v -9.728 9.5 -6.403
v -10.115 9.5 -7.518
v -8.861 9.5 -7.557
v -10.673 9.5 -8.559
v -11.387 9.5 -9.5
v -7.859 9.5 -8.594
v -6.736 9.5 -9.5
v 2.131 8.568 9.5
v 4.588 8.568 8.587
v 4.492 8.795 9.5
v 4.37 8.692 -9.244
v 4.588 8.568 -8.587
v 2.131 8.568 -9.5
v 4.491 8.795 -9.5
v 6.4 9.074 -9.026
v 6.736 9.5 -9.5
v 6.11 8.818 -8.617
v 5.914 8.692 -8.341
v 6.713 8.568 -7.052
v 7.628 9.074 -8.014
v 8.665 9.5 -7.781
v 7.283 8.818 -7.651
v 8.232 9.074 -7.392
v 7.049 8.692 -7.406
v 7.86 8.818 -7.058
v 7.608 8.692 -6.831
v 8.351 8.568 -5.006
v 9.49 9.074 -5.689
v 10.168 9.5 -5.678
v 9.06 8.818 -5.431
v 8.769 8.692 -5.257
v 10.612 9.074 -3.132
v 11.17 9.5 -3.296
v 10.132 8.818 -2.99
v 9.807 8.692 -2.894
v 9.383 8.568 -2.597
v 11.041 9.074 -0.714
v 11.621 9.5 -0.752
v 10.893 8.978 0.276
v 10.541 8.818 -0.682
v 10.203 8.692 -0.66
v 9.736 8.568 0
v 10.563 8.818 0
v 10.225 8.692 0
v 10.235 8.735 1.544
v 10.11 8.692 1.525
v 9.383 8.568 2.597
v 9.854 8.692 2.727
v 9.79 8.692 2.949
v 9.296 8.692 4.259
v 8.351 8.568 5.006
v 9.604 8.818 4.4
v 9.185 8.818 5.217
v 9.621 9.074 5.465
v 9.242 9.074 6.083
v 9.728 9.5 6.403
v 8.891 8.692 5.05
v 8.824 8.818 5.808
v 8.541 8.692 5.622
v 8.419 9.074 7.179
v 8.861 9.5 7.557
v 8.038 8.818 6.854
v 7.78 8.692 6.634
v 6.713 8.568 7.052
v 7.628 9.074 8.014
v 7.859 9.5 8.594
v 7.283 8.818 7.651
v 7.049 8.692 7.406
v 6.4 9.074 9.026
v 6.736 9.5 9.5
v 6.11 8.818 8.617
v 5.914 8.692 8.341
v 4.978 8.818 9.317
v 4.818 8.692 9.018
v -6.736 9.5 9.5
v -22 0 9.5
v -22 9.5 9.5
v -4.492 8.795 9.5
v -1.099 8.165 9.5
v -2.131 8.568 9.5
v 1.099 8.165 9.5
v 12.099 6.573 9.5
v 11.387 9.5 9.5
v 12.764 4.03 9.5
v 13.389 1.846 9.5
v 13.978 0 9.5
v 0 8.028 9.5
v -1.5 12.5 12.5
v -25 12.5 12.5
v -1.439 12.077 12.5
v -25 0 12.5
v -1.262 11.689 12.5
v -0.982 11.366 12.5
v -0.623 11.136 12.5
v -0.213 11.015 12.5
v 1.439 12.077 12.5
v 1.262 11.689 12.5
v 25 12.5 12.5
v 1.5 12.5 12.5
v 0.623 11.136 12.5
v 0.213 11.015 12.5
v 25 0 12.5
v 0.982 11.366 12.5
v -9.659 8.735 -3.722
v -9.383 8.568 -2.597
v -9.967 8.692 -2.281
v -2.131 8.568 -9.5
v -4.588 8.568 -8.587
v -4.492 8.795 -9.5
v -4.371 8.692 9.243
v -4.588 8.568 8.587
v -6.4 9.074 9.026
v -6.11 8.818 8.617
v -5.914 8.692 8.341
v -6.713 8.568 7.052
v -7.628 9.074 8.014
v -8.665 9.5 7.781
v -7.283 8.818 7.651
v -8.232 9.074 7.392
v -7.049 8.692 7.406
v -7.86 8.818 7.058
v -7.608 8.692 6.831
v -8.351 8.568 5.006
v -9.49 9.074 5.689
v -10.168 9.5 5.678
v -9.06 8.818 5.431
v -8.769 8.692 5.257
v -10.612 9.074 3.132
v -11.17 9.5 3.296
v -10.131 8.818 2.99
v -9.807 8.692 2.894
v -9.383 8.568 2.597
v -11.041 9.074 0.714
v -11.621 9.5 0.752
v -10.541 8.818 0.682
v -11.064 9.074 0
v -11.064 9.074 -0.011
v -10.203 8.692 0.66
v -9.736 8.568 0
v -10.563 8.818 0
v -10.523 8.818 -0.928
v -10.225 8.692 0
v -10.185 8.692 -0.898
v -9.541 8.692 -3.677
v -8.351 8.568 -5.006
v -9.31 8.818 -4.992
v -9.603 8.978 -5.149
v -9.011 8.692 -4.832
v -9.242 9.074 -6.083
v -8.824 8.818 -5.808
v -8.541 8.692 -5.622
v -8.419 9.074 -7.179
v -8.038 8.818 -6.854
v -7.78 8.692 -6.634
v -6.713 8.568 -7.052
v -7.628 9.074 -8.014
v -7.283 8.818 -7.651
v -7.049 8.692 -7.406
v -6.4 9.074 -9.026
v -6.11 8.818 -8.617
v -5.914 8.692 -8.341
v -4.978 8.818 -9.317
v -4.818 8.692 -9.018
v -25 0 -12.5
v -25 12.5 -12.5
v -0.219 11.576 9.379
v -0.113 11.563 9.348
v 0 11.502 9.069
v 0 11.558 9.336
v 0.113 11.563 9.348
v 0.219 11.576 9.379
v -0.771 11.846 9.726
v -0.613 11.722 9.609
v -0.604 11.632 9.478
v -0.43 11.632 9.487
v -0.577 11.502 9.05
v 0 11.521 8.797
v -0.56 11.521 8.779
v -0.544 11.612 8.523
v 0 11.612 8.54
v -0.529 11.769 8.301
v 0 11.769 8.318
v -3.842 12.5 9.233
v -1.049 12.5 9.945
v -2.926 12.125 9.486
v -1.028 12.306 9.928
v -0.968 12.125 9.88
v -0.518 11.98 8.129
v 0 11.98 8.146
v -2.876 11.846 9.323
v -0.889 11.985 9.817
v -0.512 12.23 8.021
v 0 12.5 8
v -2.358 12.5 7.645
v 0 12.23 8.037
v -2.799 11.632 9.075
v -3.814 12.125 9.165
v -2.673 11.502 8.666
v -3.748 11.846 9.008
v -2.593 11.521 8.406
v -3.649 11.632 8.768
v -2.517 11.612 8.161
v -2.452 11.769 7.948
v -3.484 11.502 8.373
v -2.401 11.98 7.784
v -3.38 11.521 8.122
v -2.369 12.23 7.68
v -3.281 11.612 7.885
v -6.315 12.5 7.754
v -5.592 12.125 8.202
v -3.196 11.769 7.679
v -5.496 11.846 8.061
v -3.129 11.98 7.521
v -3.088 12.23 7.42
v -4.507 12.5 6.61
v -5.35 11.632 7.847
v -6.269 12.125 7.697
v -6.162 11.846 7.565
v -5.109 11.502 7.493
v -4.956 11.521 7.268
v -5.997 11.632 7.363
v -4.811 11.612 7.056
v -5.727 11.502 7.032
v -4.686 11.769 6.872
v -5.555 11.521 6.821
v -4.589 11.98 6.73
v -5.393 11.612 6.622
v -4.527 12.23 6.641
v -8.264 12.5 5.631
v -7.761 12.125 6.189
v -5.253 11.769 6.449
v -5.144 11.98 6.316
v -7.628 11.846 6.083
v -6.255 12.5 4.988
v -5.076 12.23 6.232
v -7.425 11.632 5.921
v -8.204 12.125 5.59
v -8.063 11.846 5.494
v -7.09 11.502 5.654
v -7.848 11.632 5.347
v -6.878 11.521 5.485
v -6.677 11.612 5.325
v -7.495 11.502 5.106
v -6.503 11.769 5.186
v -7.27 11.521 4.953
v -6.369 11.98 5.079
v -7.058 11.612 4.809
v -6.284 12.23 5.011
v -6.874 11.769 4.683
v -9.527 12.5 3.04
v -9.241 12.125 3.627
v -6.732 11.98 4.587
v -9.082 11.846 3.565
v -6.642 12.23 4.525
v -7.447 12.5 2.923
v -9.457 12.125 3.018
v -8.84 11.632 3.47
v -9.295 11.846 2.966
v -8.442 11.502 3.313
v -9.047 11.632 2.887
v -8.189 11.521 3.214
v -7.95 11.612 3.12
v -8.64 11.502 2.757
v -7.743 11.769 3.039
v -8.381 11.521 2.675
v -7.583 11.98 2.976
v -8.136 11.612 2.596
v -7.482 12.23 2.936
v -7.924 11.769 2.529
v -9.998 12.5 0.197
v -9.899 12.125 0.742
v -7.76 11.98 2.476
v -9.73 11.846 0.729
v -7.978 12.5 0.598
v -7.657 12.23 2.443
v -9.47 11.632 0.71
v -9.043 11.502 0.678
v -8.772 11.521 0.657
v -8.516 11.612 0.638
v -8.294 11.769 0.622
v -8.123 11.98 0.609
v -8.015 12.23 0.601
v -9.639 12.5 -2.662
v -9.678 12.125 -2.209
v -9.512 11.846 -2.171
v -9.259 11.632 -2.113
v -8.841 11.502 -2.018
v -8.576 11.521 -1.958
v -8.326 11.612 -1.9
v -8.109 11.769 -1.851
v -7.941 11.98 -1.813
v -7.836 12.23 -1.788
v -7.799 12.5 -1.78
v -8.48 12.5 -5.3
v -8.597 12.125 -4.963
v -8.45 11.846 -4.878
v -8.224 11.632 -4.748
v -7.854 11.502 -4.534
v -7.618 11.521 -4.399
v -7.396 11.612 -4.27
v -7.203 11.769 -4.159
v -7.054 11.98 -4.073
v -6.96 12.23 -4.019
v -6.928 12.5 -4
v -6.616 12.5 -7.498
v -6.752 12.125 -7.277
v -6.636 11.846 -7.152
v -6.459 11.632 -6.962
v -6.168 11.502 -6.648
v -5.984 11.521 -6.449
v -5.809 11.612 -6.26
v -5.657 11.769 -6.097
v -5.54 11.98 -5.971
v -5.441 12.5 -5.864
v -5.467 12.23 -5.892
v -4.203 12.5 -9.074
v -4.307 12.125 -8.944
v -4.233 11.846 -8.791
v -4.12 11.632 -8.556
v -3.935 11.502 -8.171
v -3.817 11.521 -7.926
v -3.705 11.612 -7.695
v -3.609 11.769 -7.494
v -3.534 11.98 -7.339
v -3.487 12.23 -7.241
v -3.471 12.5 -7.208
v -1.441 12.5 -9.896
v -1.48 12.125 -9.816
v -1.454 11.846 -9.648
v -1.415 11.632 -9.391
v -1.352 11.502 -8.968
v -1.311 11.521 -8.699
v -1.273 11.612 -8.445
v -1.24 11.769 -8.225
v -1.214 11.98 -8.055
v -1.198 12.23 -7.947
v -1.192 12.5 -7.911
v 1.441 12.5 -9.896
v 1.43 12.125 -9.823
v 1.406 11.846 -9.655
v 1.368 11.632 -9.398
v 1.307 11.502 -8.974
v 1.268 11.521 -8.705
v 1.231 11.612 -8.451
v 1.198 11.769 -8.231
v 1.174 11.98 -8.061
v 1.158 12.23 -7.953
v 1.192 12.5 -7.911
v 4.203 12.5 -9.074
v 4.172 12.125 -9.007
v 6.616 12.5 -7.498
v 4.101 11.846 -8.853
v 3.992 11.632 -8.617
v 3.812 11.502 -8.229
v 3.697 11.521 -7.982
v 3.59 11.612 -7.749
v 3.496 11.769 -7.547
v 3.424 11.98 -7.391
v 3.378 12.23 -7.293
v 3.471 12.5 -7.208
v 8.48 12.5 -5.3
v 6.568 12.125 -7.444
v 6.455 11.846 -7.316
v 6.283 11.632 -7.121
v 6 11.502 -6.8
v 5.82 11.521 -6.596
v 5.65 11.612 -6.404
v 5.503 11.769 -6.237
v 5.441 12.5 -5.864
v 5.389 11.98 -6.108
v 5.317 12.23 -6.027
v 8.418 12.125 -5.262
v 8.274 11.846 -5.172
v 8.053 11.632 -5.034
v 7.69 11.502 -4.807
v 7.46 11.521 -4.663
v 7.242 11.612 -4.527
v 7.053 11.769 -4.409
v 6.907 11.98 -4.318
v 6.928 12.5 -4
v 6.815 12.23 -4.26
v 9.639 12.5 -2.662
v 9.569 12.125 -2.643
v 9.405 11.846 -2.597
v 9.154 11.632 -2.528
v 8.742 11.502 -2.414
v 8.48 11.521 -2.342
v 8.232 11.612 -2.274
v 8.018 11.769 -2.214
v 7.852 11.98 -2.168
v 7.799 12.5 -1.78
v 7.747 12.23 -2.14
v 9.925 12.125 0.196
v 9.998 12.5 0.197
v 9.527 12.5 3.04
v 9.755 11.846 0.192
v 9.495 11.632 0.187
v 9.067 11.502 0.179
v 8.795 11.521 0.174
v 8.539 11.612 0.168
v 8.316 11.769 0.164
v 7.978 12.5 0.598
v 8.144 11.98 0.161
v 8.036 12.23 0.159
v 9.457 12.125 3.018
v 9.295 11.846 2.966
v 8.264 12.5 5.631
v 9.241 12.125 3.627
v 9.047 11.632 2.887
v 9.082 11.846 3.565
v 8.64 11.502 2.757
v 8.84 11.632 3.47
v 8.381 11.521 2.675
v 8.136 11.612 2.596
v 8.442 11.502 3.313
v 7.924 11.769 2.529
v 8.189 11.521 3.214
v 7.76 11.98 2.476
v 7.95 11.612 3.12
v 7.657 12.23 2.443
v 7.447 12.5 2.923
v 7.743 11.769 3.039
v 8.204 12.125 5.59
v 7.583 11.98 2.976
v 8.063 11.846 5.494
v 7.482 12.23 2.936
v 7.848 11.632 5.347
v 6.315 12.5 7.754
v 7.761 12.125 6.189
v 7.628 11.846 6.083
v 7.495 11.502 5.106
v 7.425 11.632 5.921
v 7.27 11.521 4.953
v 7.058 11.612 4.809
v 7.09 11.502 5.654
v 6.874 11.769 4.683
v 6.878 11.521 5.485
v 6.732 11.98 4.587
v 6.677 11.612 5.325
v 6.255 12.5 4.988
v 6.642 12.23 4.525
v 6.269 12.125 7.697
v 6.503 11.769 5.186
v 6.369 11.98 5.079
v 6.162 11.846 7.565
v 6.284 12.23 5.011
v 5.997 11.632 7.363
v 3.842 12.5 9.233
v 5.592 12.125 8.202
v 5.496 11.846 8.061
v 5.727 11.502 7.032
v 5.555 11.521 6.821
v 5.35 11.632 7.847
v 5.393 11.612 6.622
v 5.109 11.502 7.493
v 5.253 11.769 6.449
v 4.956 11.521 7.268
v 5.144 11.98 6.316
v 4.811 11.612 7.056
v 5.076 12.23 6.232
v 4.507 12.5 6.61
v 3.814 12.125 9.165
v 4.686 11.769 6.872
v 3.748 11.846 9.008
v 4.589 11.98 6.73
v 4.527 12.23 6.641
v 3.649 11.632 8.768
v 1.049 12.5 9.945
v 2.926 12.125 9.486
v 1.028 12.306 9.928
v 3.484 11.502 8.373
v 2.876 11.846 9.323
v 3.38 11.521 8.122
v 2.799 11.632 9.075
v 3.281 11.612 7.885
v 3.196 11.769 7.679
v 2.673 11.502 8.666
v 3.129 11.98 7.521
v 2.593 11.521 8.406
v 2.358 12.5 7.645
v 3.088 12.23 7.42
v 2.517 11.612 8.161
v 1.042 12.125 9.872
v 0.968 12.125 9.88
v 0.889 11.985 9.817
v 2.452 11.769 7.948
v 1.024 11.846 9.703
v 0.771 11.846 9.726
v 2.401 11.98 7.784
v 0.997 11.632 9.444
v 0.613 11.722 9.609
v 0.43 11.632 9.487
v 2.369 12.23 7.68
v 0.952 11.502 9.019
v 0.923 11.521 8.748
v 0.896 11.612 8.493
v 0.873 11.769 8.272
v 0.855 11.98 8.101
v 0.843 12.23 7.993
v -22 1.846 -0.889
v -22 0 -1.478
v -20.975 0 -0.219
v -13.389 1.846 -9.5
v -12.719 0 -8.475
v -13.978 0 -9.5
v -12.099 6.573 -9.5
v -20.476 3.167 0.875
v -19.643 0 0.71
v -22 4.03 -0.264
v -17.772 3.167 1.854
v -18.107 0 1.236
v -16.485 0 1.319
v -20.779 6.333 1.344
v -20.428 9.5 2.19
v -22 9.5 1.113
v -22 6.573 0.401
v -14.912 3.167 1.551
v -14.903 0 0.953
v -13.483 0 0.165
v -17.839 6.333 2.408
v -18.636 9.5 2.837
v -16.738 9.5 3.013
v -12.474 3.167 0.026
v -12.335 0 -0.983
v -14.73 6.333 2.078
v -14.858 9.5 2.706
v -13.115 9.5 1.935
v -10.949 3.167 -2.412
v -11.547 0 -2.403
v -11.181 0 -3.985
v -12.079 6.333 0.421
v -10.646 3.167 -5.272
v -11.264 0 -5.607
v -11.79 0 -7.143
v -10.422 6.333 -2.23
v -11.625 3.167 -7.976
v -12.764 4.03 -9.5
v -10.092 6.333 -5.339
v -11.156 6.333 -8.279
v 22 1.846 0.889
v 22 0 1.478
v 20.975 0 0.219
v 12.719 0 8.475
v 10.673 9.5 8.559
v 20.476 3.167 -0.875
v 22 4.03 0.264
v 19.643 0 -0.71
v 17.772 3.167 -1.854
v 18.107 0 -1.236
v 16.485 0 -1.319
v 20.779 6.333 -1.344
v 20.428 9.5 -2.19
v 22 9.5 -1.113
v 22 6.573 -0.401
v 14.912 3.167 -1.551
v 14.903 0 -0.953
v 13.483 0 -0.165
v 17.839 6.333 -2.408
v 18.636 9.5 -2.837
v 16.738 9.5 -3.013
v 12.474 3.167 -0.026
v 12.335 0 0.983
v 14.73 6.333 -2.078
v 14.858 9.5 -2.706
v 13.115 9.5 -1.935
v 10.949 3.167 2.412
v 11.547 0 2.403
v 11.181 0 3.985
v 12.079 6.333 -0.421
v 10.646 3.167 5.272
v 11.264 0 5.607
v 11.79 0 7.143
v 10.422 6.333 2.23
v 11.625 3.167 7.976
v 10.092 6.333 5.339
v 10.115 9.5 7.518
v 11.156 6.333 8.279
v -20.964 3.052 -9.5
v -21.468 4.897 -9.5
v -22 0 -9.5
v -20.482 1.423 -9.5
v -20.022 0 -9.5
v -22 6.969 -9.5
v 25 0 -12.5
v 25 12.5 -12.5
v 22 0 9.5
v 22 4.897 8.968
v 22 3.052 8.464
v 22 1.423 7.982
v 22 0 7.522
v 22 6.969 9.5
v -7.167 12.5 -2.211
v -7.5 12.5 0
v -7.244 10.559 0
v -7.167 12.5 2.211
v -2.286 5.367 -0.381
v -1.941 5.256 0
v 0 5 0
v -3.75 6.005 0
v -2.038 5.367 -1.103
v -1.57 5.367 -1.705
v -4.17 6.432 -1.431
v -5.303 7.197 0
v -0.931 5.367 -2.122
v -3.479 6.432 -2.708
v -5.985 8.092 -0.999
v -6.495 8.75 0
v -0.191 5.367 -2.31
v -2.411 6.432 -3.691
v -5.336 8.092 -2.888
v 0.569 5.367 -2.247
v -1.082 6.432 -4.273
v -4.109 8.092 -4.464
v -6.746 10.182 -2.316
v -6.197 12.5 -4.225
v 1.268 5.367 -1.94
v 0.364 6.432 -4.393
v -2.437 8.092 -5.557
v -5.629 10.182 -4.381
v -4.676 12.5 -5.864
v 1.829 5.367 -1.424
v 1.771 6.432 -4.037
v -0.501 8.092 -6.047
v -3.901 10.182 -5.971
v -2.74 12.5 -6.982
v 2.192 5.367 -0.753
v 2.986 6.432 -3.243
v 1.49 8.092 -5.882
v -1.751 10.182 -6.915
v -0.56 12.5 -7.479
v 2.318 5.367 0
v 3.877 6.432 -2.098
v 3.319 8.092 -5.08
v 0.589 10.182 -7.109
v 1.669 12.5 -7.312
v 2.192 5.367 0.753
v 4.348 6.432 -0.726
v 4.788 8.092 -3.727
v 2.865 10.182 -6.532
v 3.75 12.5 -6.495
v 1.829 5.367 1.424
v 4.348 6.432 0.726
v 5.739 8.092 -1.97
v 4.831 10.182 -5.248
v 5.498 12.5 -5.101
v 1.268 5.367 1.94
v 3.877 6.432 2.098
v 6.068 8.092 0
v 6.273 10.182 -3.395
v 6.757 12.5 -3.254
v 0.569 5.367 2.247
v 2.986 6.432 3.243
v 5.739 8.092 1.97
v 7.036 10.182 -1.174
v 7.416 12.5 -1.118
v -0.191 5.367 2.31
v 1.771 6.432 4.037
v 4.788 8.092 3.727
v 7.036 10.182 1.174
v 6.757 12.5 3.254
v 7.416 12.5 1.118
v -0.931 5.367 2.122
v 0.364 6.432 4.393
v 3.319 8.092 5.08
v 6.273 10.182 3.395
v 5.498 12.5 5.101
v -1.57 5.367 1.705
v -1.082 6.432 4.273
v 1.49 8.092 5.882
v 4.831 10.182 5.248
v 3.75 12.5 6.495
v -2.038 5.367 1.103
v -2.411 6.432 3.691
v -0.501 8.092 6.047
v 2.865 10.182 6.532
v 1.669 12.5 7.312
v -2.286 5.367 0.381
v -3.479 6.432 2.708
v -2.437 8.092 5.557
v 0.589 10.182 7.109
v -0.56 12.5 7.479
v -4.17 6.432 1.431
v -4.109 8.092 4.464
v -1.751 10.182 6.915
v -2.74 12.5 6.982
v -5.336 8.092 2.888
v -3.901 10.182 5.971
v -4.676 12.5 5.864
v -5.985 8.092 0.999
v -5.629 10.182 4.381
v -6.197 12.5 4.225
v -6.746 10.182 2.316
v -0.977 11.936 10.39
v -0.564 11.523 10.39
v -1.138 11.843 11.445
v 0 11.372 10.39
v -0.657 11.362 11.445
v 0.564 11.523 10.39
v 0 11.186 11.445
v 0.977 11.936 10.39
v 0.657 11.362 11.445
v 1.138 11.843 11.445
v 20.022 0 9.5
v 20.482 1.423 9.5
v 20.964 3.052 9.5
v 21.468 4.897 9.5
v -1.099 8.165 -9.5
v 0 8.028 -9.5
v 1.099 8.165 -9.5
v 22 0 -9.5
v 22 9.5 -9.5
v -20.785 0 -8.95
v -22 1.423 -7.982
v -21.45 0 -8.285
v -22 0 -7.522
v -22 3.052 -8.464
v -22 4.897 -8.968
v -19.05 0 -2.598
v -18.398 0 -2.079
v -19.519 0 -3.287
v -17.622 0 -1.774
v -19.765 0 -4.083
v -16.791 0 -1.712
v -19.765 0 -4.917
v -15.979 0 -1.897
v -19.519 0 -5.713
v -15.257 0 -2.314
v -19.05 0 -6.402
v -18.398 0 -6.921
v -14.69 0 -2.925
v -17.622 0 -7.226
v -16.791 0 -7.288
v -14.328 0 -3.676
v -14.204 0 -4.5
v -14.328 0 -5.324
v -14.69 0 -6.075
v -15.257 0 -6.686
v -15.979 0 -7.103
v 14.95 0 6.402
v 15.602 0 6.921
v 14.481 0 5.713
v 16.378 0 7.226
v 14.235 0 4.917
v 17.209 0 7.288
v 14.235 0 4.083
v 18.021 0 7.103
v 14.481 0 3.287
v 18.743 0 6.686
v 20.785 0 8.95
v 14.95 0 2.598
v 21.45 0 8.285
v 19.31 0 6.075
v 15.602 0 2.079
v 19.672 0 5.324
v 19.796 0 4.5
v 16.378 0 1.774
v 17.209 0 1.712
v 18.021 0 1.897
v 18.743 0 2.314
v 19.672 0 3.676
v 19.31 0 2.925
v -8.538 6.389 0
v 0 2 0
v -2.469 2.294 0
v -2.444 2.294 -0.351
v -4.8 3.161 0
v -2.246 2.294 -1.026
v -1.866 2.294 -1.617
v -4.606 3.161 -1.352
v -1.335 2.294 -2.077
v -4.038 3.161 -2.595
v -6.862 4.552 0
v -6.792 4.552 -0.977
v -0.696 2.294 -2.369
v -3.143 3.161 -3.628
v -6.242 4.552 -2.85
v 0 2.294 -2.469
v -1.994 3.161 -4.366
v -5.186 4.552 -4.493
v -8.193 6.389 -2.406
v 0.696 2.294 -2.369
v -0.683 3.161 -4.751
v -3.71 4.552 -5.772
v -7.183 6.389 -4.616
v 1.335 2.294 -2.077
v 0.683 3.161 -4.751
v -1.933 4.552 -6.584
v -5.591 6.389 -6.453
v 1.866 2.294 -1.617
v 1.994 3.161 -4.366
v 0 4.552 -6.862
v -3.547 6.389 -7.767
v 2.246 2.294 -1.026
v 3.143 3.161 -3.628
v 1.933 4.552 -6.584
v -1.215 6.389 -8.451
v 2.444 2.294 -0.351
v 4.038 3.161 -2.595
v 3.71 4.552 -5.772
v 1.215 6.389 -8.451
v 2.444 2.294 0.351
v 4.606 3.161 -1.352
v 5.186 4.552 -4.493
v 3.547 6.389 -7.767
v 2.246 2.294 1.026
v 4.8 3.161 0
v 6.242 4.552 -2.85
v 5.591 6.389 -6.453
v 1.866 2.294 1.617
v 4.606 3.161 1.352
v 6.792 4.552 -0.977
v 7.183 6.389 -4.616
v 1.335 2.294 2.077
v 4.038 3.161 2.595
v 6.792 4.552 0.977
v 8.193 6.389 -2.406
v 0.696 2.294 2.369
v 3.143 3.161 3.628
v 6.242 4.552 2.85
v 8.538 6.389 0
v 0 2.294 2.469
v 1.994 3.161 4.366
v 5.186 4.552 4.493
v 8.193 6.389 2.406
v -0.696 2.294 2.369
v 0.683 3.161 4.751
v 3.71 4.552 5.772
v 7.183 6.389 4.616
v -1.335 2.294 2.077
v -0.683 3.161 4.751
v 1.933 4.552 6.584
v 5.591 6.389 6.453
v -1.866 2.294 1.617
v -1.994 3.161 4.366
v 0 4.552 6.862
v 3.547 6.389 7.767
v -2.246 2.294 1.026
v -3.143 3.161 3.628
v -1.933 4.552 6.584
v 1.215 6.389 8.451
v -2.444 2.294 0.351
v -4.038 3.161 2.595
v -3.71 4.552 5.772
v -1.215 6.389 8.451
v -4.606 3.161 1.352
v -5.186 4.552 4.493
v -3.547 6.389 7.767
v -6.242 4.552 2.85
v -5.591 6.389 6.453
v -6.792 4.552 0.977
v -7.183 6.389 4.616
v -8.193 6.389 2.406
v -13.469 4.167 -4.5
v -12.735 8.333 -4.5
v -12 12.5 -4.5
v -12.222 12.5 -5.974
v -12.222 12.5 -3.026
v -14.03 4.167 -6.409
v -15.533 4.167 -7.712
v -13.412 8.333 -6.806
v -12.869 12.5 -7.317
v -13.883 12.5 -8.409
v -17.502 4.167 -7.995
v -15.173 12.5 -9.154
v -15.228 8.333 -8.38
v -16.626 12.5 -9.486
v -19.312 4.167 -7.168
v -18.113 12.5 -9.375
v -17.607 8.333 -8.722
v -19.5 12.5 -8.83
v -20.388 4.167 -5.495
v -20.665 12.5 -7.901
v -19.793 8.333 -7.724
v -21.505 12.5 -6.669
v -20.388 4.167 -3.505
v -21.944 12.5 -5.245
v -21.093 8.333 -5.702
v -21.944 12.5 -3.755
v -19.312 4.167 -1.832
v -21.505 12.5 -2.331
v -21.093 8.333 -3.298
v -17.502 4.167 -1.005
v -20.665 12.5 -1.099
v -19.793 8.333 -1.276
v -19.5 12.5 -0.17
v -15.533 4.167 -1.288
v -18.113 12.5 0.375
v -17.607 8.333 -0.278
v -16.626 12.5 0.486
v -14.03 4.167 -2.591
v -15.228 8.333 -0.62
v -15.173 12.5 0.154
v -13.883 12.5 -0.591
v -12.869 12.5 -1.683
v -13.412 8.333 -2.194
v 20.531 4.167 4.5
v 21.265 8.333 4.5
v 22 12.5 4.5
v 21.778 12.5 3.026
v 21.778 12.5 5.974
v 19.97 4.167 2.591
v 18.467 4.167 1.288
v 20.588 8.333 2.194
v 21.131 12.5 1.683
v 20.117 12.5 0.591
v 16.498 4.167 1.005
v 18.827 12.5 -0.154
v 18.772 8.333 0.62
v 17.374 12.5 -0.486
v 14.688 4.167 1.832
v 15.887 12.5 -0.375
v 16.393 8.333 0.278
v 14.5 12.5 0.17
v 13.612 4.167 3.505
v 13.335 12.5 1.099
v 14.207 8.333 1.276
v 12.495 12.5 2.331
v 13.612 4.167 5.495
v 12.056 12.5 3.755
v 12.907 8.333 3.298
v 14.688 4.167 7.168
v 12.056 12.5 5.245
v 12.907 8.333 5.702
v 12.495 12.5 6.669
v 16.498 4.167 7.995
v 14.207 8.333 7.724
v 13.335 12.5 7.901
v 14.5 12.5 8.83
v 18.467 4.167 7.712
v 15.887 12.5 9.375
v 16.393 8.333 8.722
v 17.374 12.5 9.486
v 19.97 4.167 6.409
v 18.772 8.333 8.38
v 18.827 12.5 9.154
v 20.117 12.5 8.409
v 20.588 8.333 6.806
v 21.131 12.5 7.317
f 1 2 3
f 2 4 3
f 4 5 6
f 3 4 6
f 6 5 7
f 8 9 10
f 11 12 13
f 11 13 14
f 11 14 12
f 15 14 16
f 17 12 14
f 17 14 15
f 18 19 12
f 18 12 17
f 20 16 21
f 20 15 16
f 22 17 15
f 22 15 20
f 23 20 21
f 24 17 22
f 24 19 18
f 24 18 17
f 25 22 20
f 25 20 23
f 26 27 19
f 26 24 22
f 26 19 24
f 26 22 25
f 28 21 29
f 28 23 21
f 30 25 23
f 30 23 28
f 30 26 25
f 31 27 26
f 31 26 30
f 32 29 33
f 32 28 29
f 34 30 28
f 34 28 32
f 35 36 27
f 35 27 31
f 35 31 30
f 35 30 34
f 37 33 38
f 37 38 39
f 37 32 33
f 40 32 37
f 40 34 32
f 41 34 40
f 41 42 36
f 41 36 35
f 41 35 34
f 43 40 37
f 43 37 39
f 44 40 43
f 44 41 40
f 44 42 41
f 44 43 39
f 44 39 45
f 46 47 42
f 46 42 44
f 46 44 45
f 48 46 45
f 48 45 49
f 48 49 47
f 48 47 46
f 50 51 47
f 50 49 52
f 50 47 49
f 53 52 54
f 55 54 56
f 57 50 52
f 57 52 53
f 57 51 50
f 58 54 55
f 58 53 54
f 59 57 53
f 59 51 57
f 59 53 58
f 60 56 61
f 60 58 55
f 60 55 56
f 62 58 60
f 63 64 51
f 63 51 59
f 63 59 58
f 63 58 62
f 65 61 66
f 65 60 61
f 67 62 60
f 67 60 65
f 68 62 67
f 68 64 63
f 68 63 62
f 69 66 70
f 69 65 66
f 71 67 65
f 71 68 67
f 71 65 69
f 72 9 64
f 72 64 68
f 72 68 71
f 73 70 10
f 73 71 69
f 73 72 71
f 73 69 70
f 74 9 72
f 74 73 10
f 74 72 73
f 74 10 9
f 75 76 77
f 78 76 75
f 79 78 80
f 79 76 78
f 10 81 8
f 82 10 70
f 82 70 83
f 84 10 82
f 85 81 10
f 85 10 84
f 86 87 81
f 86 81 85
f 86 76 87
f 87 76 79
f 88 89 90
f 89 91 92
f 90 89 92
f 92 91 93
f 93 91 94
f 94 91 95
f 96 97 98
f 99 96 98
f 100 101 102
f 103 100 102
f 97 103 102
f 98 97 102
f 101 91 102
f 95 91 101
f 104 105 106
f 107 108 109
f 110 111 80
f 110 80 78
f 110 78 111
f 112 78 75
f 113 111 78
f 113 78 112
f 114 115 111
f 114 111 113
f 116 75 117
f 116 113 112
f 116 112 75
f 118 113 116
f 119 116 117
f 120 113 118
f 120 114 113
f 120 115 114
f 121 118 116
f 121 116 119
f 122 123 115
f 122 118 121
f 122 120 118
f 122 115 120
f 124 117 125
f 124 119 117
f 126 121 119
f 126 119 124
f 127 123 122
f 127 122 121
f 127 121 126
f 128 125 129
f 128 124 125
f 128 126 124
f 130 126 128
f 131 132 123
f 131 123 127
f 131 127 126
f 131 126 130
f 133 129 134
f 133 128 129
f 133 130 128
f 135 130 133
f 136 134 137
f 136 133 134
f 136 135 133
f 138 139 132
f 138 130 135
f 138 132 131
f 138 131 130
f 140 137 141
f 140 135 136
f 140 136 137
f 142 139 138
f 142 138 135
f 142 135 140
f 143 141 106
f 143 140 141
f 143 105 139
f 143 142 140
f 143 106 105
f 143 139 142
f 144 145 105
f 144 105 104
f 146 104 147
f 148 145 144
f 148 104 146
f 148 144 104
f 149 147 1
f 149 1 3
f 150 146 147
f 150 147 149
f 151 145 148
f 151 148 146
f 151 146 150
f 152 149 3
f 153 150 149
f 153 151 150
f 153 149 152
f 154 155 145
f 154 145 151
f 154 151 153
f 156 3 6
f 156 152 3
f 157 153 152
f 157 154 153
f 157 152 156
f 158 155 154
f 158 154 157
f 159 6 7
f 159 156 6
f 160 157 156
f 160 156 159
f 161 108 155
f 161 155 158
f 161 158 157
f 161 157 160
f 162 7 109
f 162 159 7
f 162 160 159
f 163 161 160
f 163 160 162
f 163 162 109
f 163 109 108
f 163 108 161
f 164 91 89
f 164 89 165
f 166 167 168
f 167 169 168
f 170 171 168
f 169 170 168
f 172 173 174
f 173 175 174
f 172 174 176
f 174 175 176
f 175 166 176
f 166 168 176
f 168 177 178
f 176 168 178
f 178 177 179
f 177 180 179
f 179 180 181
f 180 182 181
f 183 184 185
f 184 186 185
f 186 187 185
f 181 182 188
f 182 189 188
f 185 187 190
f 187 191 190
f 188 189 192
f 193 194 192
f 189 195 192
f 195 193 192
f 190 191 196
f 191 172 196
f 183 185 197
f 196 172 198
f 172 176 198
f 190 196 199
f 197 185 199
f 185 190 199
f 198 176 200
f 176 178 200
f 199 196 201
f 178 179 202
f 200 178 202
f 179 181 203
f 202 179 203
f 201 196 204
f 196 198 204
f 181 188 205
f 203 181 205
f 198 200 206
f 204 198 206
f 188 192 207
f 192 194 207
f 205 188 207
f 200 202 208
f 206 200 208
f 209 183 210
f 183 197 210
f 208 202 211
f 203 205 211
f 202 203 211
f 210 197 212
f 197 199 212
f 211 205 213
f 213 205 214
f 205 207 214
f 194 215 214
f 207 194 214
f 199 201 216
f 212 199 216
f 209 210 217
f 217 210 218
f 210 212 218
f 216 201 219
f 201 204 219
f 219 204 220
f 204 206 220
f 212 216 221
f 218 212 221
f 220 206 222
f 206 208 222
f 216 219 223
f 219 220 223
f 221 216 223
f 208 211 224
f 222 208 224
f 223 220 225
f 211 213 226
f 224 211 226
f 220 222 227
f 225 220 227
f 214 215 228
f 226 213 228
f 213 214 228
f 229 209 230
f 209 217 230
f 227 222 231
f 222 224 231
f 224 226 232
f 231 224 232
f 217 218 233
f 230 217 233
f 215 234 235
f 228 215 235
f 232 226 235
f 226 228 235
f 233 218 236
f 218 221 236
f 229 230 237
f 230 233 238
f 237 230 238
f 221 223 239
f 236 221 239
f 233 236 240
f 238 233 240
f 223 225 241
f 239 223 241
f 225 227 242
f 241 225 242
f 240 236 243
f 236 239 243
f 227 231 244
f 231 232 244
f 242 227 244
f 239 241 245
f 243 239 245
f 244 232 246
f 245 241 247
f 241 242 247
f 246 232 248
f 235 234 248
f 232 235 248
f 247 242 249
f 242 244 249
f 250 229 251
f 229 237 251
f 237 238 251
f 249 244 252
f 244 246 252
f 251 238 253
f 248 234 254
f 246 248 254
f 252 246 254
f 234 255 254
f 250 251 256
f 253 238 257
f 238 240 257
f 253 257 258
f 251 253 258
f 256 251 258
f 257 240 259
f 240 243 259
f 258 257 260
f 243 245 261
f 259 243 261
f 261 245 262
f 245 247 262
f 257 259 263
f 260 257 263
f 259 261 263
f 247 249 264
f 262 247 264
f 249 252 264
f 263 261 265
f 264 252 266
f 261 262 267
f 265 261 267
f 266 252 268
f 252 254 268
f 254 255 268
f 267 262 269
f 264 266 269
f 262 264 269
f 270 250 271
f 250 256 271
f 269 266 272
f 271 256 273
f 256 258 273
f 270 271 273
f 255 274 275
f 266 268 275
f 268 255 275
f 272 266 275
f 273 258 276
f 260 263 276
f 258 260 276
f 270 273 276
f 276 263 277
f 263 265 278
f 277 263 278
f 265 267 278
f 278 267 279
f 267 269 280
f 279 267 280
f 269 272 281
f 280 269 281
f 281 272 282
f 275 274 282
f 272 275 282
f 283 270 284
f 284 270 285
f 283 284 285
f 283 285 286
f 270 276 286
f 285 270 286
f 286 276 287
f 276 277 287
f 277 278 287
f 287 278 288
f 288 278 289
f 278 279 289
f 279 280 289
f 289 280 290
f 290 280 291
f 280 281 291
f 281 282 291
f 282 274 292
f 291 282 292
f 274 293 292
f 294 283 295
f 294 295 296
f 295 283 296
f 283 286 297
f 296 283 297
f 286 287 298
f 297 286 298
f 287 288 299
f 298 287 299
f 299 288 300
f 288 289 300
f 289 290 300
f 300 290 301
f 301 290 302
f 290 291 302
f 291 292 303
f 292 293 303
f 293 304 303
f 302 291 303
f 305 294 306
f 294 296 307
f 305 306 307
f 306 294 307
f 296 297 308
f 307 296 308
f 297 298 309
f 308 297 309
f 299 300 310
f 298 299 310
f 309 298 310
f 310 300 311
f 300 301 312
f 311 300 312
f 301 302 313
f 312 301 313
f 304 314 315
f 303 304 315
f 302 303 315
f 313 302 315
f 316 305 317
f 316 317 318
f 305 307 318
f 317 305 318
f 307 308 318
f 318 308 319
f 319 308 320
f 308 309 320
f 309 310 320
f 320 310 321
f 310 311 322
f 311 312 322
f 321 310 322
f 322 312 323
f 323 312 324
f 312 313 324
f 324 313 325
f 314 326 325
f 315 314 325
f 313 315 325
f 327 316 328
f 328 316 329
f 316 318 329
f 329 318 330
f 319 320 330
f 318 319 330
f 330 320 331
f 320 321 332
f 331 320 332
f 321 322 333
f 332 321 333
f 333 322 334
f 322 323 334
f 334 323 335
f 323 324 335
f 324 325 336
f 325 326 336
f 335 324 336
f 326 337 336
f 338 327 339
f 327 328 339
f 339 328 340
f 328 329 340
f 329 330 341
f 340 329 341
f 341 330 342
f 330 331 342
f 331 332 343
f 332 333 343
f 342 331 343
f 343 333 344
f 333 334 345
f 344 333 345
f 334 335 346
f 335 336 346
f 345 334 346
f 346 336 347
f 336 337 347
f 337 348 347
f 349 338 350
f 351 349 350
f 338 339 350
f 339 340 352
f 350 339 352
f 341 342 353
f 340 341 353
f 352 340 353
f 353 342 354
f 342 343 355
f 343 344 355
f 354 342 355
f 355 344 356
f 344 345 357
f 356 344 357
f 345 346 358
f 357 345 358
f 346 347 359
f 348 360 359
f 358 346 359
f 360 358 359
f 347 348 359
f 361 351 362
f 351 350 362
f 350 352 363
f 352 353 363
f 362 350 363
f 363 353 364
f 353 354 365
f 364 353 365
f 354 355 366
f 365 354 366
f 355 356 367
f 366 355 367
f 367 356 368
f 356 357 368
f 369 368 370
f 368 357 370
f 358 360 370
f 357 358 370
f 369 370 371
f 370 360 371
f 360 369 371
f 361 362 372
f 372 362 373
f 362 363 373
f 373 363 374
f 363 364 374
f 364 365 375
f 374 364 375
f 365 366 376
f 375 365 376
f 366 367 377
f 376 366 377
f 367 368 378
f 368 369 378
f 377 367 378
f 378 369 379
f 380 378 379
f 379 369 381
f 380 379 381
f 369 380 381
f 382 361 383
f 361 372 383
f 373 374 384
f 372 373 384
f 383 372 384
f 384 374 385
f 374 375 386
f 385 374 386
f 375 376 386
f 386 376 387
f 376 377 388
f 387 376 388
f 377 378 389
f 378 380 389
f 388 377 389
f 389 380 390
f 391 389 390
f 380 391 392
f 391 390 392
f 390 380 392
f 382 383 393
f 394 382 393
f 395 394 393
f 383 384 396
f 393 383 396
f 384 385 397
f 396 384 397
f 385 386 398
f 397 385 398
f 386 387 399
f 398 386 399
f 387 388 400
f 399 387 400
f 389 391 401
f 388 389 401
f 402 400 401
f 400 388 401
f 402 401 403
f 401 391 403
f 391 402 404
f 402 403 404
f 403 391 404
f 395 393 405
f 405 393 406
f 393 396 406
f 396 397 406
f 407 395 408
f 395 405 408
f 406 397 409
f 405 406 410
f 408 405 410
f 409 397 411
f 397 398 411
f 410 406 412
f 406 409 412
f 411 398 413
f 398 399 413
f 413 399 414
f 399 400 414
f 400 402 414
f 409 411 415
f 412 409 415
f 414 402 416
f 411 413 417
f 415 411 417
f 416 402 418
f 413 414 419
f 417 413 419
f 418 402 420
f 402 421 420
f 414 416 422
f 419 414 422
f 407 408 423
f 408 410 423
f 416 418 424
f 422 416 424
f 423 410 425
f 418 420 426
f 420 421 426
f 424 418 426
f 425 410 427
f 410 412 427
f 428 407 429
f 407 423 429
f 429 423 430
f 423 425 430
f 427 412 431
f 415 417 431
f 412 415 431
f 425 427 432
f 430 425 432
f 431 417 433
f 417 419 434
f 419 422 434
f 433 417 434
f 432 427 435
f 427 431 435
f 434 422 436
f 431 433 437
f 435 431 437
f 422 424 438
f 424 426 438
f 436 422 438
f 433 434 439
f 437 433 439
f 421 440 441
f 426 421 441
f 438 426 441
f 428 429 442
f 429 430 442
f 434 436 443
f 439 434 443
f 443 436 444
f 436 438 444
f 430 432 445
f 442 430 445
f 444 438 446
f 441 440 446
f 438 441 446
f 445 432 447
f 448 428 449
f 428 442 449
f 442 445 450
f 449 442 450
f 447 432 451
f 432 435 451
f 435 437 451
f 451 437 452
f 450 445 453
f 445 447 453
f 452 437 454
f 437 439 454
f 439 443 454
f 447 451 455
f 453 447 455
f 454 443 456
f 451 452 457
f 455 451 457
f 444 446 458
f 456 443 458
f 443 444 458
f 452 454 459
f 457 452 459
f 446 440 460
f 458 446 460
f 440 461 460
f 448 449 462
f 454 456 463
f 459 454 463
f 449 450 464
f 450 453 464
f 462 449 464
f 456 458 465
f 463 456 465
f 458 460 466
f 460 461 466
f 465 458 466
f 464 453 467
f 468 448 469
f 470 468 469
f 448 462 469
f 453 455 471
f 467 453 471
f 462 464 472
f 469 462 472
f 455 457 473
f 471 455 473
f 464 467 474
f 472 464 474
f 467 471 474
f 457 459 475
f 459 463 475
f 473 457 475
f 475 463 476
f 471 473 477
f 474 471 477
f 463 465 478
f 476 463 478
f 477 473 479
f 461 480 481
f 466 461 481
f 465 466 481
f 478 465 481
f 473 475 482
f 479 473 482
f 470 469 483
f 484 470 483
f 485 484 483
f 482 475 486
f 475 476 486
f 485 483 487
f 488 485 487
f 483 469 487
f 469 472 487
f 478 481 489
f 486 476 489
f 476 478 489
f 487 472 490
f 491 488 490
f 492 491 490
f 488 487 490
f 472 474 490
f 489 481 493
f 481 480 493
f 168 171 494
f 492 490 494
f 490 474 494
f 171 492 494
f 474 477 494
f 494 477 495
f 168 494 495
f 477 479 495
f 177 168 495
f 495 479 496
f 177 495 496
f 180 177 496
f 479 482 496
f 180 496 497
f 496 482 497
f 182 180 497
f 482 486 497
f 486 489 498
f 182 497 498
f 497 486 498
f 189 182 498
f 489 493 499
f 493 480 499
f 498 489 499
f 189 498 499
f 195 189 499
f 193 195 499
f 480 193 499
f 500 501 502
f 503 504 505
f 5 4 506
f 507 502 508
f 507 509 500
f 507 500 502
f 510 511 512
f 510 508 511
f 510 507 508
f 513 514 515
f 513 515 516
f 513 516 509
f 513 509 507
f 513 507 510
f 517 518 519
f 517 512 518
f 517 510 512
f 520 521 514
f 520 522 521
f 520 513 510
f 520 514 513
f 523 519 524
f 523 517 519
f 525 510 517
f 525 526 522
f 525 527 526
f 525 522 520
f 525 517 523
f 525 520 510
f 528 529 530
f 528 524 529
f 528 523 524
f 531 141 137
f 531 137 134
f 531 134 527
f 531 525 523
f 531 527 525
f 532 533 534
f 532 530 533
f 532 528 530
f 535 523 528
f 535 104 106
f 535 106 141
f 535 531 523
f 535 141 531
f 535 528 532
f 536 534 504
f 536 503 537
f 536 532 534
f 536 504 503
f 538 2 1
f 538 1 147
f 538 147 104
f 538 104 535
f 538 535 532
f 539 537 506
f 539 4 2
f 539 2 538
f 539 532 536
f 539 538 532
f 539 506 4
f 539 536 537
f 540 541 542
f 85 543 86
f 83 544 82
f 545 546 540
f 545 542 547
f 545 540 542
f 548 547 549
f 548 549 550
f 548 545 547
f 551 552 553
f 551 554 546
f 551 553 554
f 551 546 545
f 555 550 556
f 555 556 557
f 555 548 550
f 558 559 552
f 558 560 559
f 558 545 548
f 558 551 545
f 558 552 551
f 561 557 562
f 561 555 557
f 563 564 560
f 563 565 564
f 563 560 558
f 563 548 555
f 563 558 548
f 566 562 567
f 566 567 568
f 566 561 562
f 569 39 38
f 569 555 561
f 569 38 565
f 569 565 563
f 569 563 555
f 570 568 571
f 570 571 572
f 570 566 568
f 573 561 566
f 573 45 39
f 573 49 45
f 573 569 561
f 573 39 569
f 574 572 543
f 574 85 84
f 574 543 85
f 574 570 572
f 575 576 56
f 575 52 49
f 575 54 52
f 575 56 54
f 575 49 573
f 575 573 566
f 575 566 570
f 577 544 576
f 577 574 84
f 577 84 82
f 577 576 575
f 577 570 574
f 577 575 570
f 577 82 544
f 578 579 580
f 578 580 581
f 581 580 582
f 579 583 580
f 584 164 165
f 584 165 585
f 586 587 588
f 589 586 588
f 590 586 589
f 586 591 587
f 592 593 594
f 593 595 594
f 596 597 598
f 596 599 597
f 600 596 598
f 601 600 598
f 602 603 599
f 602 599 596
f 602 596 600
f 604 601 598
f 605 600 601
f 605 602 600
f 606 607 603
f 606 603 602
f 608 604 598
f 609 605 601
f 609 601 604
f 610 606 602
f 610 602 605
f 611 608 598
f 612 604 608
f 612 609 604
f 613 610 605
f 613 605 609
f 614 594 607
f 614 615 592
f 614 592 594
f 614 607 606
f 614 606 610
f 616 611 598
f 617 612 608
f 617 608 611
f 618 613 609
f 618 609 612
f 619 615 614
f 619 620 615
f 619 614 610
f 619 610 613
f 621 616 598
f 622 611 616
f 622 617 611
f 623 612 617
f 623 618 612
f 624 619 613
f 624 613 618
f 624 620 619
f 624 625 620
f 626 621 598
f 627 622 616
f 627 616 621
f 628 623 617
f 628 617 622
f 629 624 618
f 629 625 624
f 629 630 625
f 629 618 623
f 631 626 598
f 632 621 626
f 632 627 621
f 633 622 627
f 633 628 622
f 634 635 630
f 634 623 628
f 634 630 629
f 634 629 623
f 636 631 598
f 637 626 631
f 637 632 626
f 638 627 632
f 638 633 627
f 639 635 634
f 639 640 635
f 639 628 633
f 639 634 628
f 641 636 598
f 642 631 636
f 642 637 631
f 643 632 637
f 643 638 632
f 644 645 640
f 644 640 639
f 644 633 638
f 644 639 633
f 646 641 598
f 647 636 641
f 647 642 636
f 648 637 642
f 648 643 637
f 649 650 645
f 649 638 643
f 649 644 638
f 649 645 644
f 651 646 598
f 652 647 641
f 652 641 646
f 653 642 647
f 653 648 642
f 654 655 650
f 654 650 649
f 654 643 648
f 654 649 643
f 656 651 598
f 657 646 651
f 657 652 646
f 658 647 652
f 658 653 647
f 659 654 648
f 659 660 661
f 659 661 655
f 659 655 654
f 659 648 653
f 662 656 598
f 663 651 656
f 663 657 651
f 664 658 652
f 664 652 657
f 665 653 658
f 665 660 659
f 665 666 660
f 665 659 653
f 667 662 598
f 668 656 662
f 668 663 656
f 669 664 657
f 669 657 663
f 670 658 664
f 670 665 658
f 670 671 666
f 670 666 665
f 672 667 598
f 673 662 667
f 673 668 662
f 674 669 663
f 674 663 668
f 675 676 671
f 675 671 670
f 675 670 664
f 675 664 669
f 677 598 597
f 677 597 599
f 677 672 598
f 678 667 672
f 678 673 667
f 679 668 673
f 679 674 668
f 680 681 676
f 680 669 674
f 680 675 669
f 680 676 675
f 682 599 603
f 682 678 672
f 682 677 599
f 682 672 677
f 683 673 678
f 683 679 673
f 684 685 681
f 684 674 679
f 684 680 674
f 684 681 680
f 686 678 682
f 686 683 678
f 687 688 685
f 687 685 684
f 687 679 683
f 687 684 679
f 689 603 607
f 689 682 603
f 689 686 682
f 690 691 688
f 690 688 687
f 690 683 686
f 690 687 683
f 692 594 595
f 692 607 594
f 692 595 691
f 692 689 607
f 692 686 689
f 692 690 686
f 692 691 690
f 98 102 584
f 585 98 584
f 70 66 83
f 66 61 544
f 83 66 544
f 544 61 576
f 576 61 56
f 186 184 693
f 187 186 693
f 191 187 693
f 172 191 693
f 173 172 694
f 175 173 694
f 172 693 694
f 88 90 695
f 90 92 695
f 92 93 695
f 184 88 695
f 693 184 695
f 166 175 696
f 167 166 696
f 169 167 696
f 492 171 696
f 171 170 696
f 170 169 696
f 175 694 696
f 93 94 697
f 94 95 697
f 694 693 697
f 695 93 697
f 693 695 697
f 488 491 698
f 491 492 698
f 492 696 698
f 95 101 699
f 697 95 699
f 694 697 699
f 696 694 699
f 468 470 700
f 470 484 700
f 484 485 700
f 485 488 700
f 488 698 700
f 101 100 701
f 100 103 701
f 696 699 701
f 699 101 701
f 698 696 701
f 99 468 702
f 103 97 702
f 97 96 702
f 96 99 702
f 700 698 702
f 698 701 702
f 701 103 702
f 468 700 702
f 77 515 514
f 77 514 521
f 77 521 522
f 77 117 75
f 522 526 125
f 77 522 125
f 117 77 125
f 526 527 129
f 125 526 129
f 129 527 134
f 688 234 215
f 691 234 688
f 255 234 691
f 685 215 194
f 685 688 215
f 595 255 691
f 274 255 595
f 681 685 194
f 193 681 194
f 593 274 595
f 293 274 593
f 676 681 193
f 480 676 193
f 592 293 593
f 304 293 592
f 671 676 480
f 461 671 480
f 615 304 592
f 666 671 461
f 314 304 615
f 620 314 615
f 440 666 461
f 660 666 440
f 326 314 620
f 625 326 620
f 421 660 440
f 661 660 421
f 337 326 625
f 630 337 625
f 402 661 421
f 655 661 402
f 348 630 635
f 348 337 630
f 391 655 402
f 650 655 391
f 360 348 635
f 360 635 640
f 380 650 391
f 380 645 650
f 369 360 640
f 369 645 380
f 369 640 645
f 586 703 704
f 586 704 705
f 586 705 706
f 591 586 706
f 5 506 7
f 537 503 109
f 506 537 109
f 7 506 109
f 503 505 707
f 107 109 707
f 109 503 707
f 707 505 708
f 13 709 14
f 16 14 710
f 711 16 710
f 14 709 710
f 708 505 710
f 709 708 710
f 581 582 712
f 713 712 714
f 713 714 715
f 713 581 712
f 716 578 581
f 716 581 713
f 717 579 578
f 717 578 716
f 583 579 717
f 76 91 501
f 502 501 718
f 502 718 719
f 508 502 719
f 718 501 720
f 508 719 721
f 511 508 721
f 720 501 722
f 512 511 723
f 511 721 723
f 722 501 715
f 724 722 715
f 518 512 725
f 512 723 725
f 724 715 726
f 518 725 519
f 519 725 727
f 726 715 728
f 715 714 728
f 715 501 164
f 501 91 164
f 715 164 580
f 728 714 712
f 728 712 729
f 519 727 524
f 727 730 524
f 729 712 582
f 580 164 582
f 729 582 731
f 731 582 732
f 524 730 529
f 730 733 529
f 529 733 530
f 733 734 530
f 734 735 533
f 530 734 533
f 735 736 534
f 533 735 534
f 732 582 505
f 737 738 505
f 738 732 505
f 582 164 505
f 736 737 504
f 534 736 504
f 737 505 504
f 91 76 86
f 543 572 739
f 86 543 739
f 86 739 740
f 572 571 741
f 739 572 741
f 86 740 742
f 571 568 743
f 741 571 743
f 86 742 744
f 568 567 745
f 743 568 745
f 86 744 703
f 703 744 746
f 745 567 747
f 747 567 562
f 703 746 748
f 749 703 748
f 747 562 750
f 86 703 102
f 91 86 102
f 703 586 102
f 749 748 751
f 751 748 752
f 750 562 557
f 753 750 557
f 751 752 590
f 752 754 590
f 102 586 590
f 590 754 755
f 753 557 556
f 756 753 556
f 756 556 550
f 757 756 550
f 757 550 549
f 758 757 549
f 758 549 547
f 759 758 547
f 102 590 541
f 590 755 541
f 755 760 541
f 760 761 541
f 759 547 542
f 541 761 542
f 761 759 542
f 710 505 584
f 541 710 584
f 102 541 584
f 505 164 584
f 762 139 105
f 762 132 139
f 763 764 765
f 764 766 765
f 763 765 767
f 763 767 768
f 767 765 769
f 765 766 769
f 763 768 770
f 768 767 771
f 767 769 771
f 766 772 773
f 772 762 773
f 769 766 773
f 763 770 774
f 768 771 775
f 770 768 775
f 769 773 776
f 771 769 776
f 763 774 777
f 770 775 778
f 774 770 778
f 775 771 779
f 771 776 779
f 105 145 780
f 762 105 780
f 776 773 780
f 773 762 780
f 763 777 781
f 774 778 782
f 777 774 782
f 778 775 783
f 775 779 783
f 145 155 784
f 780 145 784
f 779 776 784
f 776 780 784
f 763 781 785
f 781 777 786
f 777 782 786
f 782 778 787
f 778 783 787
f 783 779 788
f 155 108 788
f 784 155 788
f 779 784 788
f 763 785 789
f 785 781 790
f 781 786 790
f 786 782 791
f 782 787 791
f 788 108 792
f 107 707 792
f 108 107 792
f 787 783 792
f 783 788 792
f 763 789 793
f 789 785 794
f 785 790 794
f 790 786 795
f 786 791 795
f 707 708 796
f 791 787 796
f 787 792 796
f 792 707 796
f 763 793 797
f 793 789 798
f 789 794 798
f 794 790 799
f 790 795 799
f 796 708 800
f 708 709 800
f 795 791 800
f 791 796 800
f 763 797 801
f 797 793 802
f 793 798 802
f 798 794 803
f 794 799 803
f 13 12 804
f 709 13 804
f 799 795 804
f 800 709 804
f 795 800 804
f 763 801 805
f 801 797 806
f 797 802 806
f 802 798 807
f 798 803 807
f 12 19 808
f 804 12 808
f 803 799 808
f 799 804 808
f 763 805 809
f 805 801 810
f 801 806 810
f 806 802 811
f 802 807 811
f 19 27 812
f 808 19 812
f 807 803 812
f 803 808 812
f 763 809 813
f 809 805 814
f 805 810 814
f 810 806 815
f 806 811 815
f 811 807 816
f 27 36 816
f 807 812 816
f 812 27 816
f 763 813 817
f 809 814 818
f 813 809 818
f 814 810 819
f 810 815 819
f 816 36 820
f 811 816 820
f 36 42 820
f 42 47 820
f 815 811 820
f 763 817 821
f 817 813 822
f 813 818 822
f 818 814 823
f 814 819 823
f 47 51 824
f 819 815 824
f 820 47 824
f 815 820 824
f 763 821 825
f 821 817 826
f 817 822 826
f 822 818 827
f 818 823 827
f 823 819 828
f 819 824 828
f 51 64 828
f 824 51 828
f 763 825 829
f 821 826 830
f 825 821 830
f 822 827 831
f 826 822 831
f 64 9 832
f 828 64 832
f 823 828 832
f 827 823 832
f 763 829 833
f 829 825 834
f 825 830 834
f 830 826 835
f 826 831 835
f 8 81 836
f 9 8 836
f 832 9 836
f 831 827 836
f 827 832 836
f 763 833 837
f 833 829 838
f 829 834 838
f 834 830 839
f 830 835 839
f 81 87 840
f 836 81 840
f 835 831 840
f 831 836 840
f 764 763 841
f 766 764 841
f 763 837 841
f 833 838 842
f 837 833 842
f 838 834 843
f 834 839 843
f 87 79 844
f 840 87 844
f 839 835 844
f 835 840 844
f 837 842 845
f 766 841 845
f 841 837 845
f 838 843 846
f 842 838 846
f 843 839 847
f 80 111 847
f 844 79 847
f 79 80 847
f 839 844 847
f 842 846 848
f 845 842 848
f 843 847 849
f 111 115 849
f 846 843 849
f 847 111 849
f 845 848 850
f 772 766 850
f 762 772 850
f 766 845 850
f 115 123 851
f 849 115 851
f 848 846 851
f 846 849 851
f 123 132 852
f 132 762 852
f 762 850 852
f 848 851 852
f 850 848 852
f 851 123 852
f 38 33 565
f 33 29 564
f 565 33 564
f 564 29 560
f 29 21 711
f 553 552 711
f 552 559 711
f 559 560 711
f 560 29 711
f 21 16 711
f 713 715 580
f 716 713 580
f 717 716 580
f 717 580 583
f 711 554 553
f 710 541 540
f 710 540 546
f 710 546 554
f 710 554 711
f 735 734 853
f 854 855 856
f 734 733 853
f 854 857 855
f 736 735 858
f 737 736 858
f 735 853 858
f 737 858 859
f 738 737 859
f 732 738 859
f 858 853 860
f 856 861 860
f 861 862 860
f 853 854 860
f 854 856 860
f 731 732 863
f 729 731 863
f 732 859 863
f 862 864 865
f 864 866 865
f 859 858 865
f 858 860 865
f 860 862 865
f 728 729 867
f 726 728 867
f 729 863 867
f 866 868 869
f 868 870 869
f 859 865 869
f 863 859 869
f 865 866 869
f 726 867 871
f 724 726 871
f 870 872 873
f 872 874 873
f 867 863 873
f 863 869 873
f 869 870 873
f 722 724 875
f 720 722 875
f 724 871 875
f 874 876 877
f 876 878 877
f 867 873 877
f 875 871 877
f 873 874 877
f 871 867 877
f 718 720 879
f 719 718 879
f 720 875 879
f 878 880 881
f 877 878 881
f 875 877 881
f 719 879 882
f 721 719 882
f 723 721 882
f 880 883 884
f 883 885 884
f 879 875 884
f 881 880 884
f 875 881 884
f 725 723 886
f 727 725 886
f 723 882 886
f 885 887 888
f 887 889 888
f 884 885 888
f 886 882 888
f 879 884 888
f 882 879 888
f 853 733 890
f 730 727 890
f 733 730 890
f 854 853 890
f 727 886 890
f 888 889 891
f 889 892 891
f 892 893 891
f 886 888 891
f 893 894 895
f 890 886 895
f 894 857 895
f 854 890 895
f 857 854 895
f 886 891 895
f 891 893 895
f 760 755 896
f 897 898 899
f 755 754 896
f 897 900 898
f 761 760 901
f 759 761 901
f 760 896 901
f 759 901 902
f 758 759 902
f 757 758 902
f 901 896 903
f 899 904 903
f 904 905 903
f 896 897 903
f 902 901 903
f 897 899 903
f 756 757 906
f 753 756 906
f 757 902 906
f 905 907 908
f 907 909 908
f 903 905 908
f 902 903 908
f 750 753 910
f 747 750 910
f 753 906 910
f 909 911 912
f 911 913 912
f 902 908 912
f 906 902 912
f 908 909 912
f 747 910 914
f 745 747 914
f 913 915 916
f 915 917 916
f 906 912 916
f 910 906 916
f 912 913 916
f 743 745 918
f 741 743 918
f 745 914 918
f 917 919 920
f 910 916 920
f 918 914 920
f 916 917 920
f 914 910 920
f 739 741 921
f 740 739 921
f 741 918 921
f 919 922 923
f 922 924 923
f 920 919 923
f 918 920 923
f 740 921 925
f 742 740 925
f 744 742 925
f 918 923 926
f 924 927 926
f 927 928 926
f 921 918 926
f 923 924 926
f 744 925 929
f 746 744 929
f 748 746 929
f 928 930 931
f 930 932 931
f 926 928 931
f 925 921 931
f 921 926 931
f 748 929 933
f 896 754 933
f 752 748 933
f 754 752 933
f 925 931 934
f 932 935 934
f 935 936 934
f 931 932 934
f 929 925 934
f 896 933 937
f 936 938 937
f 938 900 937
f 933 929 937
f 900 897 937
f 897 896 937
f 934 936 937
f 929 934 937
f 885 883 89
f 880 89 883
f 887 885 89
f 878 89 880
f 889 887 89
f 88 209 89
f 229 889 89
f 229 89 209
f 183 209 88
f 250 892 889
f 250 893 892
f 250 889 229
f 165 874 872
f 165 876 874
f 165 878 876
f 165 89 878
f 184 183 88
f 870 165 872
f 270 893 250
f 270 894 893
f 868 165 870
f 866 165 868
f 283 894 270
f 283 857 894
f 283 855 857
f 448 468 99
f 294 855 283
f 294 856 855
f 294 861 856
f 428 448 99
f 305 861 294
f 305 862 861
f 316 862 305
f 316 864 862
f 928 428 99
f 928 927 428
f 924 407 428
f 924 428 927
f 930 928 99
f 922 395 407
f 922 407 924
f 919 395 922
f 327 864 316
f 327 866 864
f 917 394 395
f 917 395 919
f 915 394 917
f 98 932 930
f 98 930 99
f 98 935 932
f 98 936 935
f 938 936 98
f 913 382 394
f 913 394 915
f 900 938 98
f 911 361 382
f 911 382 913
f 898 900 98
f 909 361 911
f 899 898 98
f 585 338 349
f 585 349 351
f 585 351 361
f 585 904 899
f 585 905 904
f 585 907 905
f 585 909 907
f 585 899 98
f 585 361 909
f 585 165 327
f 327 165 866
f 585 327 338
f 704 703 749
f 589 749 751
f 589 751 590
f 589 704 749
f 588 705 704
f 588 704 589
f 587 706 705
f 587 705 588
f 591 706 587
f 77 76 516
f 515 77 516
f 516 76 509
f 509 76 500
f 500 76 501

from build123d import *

# Parameters (mm, degrees)
ESQUISSE1_W                       = 50
ESQUISSE1_H                       = 25
BOSS_EXTRU_1_DEPTH                = 12.5
ESQUISSE2_R                       = 5
ENL_V_MAT_EXTRU_1_DEPTH           = 13.5
ENL_V_MAT_EXTRU_1_DRAFT           = -10
ENL_V_MAT_EXTRU_1_PROFILE_2_DEPTH = 13.5
ENL_V_MAT_EXTRU_1_PROFILE_2_DRAFT = -10
COQUE1_T                          = -3
ESQUISSE5_R                       = 1.5
ENL_V_MAT_EXTRU_2_DEPTH           = 4
ENL_V_MAT_EXTRU_2_DRAFT           = -10


with BuildPart() as part:
    # Esquisse1 → Boss.-Extru.1 (new body)
    with BuildSketch(Plane(origin=(0, 0, 0), x_dir=(1, 0, 0), z_dir=(0, 1, 0))):
        Rectangle(ESQUISSE1_W, ESQUISSE1_H)
    extrude(amount=BOSS_EXTRU_1_DEPTH)


with BuildPart() as enl_v_mat_extru_1_tool:
    # Esquisse2 → Enlèv. mat.-Extru.1 (with draft: the straight prism first)
    with BuildSketch(Plane(origin=(0, 12.5, 0), x_dir=(1, 0, 0), z_dir=(0, 1, 0))):
        with Locations((17, -4.5)):
            Circle(ESQUISSE2_R)
    extrude(amount=-ENL_V_MAT_EXTRU_1_DEPTH)
    # Enlèv. mat.-Extru.1: the draft: its side faces are tilted about the plane it starts from
    enl_v_mat_extru_1_sides = [enl_v_mat_extru_1_tool.faces().sort_by_distance(p)[0] for p in [
        (12, 5.75, 4.5),
    ]]
    draft(enl_v_mat_extru_1_sides, Plane(origin=(0, 12.5, 0), x_dir=(1, 0, 0), z_dir=(0, 1, 0)), ENL_V_MAT_EXTRU_1_DRAFT)


with BuildPart() as part_1:
    add(part.part)

    # Enlèv. mat.-Extru.1: cut by enl_v_mat_extru_1_tool
    add(enl_v_mat_extru_1_tool.part, mode=Mode.SUBTRACT)


with BuildPart() as enl_v_mat_extru_1_profile_2_tool:
    # Esquisse2 → Enlèv. mat.-Extru.1 profile 2 (with draft: the straight prism first)
    with BuildSketch(Plane(origin=(0, 12.5, 0), x_dir=(1, 0, 0), z_dir=(0, 1, 0))):
        with Locations((-17, 4.5)):
            Circle(ESQUISSE2_R)
    extrude(amount=-ENL_V_MAT_EXTRU_1_PROFILE_2_DEPTH)
    # Enlèv. mat.-Extru.1 profile 2: the draft: its side faces are tilted about the plane it starts from
    enl_v_mat_extru_1_profile_2_sides = [enl_v_mat_extru_1_profile_2_tool.faces().sort_by_distance(p)[0] for p in [
        (-22, 5.75, -4.5),
    ]]
    draft(enl_v_mat_extru_1_profile_2_sides, Plane(origin=(0, 12.5, 0), x_dir=(1, 0, 0), z_dir=(0, 1, 0)), ENL_V_MAT_EXTRU_1_PROFILE_2_DRAFT)


with BuildPart() as part_2:
    add(part_1.part)

    # Enlèv. mat.-Extru.1 profile 2: cut by enl_v_mat_extru_1_profile_2_tool
    add(enl_v_mat_extru_1_profile_2_tool.part, mode=Mode.SUBTRACT)

    # Esquisse3 → Enlèvement de matière-Révolution1 (revolve, cut)
    with BuildSketch(Plane.XY):
        with BuildLine():
            Line((0, 20), (0, 5))
            ThreePointArc((0, 5), (-7.5, 12.5), (0, 20))
        make_face()
    revolve(axis=Axis((0, 20, 0), (0, -1, 0)), mode=Mode.SUBTRACT)

    # Esquisse4 → Enlèvement de matière-Révolution3 (revolve, cut)
    with BuildSketch(Plane.XY, mode=Mode.PRIVATE) as enl_vement_de_mati_re_r_volution3_sk:
        with BuildLine():
            Line((8, 12.5), (10, 12.5))
            ThreePointArc((10, 12.5), (9, 11.5), (8, 12.5))
        make_face()
    revolve(enl_vement_de_mati_re_r_volution3_sk.sketch.rotate(Axis((0, 20, 0), (0, -1, 0)), 90), axis=Axis((0, 20, 0), (0, -1, 0)), mode=Mode.SUBTRACT)

    # Coque1
    coque1_openings = [part_2.faces().sort_by_distance(p)[0] for p in [
        (0, 0, 0),
    ]]
    offset(amount=COQUE1_T, openings=coque1_openings)


with BuildPart() as enl_v_mat_extru_2_tool:
    # Esquisse5 → Enlèv. mat.-Extru.2 (with draft: the straight prism first)
    with BuildSketch(Plane.XY.offset(12.5)):
        with Locations((0, 12.5)):
            Circle(ESQUISSE5_R)
    extrude(amount=-ENL_V_MAT_EXTRU_2_DEPTH)
    # Enlèv. mat.-Extru.2: the draft: its side faces are tilted about the plane it starts from
    enl_v_mat_extru_2_sides = [enl_v_mat_extru_2_tool.faces().sort_by_distance(p)[0] for p in [
        (-1.5, 12.5, 10.5),
    ]]
    draft(enl_v_mat_extru_2_sides, Plane.XY.offset(12.5), ENL_V_MAT_EXTRU_2_DRAFT)


with BuildPart() as part_3:
    add(part_2.part)

    # Enlèv. mat.-Extru.2: cut by enl_v_mat_extru_2_tool
    add(enl_v_mat_extru_2_tool.part, mode=Mode.SUBTRACT)


solid = part_3.part
